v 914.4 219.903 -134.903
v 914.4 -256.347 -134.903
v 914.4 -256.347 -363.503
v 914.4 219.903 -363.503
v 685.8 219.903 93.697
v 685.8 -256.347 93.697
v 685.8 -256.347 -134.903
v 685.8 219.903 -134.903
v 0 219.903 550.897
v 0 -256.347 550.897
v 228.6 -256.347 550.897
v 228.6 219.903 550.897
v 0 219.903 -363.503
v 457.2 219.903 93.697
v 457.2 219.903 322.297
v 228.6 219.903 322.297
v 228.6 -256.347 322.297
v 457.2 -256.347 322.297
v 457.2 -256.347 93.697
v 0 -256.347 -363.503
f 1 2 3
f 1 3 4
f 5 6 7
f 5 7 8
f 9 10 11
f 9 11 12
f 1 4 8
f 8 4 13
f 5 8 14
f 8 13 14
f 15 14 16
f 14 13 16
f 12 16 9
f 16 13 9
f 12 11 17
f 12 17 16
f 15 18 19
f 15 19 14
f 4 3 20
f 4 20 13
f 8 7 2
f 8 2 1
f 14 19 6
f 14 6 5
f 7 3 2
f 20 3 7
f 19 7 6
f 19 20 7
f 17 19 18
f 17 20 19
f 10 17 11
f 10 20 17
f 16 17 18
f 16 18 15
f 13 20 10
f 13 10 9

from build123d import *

# Parameters (mm, degrees)
F0_W     = 476.25
F0_H     = 914.4
F1_DEPTH = 228.6
F2_W     = 476.25
F2_H     = 685.8
F3_DEPTH = 228.6
F4_W     = 476.25
F4_H     = 457.2
F5_DEPTH = 228.6
F6_W     = 476.25
F6_H     = 228.6
F7_DEPTH = 228.6


with BuildPart() as f1:
    # F0 (on Right) → F1 (new body)
    with BuildSketch(Plane.YZ):
        with Locations((-18.221811, 93.697212)):
            Rectangle(F0_W, F0_H)
    extrude(amount=F1_DEPTH)

    # F2 (on face) → F3 (join)
    with BuildSketch(Plane.YZ.offset(228.6)):
        with Locations((-18.221811, -20.602788)):
            Rectangle(F2_W, F2_H)
    extrude(amount=F3_DEPTH)

    # F4 (on face) → F5 (join)
    with BuildSketch(Plane.YZ.offset(457.2)):
        with Locations((-18.221811, -134.902788)):
            Rectangle(F4_W, F4_H)
    extrude(amount=F5_DEPTH)

    # F6 (on face) → F7 (join)
    with BuildSketch(Plane.YZ.offset(685.8)):
        with Locations((-18.221811, -249.202788)):
            Rectangle(F6_W, F6_H)
    extrude(amount=F7_DEPTH)


solid = f1.part
